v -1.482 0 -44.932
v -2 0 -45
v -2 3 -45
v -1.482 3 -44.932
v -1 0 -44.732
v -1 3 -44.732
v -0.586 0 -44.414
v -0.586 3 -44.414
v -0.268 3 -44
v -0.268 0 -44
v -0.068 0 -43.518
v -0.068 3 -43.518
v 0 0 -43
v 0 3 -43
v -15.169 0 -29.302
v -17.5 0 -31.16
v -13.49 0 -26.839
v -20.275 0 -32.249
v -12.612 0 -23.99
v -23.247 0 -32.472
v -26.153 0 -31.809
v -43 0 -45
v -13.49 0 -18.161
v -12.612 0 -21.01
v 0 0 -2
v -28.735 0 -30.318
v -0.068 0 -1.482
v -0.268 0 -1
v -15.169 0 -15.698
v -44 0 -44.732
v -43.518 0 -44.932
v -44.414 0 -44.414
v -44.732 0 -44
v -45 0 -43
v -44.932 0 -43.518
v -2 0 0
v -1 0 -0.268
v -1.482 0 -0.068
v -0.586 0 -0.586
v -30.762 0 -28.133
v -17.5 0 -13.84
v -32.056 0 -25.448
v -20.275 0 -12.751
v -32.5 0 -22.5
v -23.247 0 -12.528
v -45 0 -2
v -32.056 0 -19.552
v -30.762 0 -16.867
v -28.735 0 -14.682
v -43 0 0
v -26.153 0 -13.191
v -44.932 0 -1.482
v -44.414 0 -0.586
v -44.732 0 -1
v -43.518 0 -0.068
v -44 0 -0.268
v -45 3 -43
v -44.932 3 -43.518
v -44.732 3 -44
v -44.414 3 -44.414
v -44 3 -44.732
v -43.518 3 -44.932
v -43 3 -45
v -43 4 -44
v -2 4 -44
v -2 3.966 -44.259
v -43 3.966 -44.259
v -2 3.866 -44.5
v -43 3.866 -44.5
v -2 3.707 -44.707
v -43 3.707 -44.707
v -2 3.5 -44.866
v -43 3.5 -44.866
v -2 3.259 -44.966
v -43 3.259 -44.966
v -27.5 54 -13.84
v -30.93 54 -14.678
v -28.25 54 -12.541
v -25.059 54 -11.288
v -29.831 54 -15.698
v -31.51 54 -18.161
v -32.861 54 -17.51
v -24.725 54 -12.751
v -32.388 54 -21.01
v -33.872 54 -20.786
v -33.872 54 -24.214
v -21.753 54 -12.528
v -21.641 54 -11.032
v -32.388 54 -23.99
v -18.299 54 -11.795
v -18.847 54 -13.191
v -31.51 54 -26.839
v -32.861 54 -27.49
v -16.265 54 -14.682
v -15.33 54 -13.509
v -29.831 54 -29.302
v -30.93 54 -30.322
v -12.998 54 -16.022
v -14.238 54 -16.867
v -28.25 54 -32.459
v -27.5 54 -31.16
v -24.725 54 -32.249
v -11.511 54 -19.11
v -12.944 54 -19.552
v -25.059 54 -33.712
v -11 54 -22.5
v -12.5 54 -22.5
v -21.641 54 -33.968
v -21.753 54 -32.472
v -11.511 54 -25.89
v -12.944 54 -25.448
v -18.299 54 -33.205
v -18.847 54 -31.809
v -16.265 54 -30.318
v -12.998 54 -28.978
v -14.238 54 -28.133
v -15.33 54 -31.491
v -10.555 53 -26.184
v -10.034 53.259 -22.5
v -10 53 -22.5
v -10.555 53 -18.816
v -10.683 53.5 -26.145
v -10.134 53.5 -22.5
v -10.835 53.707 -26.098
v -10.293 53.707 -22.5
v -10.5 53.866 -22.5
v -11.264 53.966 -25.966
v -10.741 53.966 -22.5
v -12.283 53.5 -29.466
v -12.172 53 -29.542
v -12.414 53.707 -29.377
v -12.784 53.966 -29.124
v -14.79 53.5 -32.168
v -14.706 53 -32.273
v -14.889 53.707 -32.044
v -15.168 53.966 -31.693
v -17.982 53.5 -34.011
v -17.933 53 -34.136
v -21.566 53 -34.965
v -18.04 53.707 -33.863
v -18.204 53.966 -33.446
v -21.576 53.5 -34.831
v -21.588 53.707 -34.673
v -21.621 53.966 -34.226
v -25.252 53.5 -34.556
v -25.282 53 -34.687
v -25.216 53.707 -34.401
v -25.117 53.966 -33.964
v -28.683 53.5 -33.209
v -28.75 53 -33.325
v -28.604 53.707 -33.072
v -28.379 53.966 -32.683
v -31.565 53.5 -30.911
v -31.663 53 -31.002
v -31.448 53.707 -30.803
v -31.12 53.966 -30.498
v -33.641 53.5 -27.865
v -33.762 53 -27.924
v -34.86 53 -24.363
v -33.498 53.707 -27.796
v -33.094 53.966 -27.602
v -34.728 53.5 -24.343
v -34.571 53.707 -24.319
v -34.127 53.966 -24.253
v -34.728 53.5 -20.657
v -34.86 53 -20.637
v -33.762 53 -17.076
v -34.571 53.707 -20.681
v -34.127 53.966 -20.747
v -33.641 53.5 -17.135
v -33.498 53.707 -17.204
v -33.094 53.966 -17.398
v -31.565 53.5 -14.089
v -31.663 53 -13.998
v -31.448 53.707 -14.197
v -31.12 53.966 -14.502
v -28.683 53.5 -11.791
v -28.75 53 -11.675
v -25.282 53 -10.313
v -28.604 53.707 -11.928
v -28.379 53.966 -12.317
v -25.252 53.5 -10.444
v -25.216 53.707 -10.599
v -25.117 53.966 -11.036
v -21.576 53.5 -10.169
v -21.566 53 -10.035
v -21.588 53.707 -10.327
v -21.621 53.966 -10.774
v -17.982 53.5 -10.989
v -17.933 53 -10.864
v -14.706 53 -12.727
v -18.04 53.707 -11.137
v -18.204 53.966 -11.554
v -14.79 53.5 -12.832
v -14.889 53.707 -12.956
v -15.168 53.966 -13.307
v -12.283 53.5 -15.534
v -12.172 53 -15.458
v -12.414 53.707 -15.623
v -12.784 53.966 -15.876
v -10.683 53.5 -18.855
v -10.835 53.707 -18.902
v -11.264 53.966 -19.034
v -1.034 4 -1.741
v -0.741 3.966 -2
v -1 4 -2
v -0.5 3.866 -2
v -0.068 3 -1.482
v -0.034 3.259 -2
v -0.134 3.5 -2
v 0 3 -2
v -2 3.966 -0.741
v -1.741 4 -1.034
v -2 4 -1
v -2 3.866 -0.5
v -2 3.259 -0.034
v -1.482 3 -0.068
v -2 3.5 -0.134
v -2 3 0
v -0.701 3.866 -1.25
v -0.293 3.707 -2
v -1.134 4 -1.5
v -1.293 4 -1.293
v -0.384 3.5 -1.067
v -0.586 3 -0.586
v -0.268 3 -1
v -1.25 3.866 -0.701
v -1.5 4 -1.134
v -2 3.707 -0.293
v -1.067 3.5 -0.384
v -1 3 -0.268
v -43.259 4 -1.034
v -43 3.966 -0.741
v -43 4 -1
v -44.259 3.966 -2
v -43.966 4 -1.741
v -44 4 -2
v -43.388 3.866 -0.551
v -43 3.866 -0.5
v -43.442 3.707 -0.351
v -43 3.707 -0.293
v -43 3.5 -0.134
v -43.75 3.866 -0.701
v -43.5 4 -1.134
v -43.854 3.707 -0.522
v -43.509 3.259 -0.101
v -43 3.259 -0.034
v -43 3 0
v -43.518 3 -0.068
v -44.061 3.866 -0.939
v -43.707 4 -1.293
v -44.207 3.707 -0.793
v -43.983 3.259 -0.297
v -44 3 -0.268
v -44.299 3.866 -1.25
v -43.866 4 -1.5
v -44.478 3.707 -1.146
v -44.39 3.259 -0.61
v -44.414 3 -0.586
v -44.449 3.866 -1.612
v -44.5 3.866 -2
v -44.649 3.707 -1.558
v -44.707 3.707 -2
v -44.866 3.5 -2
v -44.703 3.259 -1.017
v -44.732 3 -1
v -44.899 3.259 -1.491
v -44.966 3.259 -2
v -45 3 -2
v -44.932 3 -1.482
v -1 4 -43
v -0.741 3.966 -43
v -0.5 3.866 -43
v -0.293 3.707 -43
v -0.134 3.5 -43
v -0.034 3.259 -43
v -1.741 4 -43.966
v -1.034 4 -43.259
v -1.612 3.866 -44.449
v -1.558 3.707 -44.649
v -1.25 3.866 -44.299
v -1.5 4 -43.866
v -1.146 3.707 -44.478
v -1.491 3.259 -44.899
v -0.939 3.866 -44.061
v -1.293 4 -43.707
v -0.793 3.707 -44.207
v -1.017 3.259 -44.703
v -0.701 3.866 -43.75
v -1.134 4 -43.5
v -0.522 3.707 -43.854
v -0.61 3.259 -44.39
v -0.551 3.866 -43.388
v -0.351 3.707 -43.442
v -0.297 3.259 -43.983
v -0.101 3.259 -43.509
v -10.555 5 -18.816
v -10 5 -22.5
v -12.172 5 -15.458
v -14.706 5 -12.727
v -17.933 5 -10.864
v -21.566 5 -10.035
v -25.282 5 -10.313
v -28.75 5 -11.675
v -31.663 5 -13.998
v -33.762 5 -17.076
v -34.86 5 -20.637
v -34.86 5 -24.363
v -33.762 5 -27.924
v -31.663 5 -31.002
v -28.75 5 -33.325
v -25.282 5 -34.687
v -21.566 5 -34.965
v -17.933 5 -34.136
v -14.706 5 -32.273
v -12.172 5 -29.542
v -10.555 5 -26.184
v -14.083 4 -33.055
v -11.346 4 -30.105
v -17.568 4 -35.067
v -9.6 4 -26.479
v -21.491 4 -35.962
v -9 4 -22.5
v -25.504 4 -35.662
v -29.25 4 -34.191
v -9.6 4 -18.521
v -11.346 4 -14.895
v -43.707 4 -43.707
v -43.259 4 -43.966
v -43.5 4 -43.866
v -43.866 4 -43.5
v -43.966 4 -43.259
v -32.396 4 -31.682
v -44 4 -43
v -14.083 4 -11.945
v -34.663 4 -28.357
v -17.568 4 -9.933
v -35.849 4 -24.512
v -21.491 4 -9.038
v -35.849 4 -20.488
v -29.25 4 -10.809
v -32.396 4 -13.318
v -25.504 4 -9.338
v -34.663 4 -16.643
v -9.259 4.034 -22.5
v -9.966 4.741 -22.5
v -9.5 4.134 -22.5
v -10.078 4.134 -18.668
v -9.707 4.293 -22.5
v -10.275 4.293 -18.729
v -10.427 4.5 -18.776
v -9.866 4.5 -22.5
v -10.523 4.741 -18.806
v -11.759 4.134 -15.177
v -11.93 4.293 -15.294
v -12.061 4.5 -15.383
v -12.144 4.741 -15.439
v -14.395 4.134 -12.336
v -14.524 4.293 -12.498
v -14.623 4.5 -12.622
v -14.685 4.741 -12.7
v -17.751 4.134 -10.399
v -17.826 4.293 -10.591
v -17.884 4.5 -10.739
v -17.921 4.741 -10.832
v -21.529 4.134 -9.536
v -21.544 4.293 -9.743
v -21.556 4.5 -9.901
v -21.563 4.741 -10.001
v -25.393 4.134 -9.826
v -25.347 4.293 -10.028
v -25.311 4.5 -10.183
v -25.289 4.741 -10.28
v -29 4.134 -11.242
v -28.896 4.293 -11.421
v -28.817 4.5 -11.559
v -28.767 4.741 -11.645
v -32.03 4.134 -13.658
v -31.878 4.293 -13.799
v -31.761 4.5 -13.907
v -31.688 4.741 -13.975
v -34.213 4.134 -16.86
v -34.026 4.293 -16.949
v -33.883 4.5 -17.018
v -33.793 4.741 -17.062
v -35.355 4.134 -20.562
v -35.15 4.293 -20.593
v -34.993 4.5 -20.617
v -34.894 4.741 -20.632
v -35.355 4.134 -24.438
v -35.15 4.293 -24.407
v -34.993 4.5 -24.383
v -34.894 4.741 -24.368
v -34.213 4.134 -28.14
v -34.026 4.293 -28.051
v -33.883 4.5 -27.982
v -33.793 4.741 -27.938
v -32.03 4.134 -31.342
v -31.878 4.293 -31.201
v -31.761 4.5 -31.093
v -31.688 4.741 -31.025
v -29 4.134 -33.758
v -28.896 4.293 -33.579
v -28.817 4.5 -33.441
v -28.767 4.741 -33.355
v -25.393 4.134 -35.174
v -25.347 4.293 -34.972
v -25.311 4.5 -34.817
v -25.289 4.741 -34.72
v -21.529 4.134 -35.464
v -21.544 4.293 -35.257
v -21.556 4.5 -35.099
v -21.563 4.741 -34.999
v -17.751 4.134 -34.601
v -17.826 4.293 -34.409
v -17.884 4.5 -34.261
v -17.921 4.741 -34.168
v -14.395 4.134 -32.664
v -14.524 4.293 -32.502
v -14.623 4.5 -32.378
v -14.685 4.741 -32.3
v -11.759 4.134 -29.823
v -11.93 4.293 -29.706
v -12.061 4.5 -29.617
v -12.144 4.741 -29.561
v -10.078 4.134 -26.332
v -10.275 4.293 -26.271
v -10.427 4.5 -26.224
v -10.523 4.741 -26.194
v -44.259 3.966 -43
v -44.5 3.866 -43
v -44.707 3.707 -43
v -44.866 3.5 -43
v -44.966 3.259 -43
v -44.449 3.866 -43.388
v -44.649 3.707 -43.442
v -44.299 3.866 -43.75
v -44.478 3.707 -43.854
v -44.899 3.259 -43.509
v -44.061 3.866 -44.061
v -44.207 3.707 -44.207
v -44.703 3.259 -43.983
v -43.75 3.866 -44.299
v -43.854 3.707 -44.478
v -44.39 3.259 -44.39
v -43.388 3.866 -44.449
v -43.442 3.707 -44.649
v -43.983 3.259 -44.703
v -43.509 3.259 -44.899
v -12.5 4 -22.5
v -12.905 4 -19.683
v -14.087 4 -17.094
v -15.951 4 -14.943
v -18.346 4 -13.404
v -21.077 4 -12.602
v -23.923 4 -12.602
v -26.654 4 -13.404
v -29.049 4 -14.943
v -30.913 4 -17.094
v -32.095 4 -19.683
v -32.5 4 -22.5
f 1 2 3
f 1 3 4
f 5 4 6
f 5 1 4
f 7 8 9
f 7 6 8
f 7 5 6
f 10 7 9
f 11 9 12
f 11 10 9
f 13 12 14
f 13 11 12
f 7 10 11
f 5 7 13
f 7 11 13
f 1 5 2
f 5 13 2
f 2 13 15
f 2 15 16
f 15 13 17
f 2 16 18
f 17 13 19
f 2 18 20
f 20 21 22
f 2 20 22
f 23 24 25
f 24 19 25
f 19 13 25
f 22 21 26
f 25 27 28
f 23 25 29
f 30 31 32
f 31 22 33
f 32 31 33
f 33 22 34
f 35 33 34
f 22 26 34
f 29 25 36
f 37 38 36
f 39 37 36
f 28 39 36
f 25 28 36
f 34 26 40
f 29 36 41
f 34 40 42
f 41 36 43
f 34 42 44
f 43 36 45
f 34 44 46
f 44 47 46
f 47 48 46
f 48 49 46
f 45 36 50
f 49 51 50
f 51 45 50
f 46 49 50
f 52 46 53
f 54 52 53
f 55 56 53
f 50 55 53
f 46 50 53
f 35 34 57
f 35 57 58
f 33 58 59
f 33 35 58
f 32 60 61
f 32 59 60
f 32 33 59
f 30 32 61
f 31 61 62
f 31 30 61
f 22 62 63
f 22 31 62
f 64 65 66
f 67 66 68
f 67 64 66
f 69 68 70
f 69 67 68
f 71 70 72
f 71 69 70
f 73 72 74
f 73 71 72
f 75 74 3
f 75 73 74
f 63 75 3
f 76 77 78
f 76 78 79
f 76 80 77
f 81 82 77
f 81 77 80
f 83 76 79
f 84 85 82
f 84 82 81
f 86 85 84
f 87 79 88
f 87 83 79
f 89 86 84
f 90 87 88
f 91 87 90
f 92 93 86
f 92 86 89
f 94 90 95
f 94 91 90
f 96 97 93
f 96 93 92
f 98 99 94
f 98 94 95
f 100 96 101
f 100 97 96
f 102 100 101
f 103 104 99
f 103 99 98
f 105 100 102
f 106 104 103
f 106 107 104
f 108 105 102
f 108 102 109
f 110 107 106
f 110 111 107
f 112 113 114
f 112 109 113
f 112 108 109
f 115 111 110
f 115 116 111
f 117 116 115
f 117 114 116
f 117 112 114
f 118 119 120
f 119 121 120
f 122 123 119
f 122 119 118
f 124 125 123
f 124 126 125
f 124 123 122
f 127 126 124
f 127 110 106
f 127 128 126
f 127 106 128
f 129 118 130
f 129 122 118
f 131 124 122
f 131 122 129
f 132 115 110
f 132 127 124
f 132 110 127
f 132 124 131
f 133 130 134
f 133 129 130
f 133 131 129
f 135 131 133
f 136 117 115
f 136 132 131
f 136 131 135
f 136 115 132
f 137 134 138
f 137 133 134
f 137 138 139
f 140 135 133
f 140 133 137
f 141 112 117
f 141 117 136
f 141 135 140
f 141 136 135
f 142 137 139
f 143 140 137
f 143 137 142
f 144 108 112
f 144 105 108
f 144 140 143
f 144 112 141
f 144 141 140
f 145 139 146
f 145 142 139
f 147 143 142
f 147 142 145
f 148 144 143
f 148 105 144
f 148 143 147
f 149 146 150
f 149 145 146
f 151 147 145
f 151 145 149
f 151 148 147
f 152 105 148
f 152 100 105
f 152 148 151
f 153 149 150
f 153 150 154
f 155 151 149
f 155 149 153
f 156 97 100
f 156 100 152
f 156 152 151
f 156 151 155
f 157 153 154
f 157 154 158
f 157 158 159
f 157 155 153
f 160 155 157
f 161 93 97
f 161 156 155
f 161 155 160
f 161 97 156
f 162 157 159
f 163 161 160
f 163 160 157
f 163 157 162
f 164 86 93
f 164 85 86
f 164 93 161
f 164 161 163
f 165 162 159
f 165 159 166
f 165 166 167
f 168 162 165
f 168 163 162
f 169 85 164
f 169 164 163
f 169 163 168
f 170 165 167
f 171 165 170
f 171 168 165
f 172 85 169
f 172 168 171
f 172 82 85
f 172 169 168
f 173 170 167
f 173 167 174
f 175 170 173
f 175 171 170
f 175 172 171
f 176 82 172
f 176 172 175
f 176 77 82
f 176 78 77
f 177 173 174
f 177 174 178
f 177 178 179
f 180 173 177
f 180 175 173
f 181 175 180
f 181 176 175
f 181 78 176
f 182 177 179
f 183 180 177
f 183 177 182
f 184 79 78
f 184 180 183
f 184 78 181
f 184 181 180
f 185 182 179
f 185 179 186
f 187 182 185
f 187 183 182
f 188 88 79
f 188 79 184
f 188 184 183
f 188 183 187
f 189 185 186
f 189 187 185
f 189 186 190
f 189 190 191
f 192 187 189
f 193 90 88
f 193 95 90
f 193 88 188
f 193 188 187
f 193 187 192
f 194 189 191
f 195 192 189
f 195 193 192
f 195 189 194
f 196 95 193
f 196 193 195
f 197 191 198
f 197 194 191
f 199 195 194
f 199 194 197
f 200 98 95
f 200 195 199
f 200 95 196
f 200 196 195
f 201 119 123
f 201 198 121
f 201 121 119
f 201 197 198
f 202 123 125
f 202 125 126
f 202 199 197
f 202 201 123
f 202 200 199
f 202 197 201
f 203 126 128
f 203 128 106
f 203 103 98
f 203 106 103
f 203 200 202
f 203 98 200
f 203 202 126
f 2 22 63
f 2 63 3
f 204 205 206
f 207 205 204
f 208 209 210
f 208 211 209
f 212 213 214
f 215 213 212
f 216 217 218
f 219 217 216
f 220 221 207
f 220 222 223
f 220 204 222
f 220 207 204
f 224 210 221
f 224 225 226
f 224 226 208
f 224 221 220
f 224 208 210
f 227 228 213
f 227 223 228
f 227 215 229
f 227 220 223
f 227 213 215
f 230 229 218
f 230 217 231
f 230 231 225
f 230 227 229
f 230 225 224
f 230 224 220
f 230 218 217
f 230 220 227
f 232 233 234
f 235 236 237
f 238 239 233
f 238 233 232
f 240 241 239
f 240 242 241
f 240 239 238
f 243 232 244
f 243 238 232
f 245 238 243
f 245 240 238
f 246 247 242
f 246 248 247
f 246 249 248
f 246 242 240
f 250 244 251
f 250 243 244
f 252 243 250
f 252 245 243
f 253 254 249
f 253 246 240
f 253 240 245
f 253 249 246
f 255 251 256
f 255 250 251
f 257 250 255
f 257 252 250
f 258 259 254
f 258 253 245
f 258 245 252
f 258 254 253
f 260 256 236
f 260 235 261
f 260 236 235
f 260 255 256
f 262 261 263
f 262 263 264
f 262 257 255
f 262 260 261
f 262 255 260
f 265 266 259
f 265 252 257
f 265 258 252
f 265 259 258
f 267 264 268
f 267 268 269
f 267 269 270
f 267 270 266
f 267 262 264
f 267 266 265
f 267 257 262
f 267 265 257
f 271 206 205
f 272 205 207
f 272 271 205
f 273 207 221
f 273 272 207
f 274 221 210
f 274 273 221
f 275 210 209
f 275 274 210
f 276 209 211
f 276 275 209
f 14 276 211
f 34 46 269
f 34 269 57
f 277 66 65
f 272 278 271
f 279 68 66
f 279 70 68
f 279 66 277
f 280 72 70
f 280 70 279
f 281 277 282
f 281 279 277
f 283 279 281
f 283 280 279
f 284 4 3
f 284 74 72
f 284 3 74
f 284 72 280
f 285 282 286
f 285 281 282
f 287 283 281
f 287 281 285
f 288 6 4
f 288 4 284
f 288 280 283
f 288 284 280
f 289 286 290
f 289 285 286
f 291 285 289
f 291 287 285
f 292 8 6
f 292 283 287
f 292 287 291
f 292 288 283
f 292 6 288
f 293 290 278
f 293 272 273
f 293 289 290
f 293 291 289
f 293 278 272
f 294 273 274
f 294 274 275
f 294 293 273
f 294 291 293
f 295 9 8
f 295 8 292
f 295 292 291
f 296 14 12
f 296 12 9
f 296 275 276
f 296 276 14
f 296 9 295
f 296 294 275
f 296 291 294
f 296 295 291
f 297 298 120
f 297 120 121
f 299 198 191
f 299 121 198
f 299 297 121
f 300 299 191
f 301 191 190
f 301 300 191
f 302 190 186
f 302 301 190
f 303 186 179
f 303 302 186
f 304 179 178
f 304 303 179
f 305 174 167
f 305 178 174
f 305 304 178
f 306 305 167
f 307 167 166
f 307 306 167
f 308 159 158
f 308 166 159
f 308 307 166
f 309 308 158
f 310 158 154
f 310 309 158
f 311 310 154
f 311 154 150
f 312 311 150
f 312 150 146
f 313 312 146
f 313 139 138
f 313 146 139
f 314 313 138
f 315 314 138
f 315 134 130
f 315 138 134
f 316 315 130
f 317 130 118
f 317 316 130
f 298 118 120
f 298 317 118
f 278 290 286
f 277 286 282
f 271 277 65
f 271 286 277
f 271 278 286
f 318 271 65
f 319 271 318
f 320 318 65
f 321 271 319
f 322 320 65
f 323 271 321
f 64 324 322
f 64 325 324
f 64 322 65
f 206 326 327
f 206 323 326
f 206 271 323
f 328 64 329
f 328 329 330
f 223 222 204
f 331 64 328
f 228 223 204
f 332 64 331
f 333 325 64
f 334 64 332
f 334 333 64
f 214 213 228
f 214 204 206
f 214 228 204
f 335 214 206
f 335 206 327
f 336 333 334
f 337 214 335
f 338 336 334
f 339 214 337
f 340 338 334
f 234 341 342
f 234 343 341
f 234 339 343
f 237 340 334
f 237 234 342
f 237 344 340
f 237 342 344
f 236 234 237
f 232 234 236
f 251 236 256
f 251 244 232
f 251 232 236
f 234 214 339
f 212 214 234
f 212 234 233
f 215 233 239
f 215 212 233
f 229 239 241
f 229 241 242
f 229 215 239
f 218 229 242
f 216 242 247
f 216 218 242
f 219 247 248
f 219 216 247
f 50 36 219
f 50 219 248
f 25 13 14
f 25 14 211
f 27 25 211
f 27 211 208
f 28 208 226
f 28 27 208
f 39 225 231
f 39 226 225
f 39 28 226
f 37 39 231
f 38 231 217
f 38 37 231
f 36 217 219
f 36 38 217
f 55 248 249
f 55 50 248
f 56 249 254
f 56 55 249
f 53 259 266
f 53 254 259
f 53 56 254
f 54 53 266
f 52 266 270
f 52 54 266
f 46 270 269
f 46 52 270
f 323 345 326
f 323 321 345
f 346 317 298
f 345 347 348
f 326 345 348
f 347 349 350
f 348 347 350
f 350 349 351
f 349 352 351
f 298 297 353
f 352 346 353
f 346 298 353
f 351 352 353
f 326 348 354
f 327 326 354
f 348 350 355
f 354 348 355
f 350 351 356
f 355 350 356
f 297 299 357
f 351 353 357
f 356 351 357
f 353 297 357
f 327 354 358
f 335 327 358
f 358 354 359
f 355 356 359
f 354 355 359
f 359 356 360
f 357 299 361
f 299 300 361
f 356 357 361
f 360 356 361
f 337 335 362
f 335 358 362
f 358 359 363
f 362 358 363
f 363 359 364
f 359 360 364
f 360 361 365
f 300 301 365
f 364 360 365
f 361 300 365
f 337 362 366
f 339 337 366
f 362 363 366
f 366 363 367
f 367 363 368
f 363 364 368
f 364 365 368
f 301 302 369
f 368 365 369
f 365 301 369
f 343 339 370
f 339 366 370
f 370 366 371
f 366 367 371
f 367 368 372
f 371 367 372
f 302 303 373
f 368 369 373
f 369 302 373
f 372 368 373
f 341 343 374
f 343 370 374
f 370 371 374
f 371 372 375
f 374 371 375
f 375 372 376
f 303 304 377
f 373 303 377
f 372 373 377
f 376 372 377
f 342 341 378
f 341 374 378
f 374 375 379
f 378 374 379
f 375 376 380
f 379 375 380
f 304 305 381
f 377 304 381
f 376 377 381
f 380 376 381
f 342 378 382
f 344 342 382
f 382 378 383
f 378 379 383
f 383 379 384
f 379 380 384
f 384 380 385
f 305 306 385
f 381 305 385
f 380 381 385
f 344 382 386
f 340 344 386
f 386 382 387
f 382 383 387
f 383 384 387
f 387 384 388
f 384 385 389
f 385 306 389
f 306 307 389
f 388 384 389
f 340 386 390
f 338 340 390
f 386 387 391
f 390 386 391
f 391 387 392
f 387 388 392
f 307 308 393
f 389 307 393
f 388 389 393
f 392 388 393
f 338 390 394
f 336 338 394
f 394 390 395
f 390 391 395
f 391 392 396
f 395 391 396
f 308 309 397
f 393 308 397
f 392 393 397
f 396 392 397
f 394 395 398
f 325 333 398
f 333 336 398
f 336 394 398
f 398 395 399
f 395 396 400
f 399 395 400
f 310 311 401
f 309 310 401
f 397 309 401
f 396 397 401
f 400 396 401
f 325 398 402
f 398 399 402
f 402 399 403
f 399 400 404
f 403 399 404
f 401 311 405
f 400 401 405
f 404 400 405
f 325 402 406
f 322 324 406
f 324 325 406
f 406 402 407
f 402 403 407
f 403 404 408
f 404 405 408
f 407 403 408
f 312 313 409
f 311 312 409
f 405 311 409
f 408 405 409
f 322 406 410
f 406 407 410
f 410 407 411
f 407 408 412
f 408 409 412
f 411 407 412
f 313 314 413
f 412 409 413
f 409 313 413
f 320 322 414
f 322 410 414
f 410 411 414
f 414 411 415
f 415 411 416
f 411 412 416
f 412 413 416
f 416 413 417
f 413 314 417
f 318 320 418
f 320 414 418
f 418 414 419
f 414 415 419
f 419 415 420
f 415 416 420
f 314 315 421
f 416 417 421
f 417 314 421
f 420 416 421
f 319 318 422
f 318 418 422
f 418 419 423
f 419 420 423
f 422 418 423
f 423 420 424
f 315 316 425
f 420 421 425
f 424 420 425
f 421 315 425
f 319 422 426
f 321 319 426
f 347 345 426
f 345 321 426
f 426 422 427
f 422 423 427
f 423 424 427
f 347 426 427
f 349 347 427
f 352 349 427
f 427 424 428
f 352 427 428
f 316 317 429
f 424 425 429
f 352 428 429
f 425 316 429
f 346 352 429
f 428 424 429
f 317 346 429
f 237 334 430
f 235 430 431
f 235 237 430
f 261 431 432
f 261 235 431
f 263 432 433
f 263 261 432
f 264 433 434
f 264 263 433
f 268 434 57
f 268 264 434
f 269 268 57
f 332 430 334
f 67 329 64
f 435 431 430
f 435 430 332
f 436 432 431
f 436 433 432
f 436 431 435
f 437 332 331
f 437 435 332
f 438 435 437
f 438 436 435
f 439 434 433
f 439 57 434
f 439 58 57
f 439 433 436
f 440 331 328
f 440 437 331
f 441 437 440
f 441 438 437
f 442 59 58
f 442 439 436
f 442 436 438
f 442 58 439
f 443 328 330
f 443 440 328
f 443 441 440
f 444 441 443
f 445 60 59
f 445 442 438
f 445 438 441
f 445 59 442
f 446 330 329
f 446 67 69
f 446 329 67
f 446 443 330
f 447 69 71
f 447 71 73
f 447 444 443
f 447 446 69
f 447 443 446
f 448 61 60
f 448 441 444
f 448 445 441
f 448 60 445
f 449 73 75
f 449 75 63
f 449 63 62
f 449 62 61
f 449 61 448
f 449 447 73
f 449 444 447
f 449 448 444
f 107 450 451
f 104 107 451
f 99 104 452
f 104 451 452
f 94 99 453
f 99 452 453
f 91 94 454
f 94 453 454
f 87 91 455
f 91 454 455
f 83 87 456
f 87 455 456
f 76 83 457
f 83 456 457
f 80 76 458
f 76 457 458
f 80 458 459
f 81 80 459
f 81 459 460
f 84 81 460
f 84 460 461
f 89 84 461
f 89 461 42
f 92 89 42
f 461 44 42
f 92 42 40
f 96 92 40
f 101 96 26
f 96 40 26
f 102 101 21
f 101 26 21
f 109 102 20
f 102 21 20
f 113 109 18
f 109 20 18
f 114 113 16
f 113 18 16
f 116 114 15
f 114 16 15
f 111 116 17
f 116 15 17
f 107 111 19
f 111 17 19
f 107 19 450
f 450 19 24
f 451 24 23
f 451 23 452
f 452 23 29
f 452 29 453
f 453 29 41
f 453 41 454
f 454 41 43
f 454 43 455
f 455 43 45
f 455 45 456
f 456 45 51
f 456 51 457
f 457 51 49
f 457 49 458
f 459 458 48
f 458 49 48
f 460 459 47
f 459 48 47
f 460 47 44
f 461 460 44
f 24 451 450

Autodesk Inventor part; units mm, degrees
ref_plane "YZ Plane" through (0, 0, 0) normal (1, 0, 0) x (0, 1, 0)
ref_plane "XZ Plane" through (0, 0, 0) normal (0, 1, 0) x (-1, 0, 0)
ref_plane "XY Plane" through (0, 0, 0) normal (0, 0, 1) x (1, 0, 0)
sketch "底面" plane through (0, 0, 0) normal (0, 1, 0) x (-1, 0, 0)
  line L0 (2, 0) -> (43, 0)
  line L1 (45, -2) -> (45, -43)
  line L2 (43, -45) -> (2, -45)
  line L3 (0, -43) -> (0, -2)
  arc A0 (45, -2) -> (43, 0) centre (43, -2) ccw
  arc A1 (43, -45) -> (45, -43) centre (43, -43) ccw
  arc A2 (0, -43) -> (2, -45) centre (2, -43) ccw
  arc A3 (2, 0) -> (0, -2) centre (2, -2) ccw
  circle A4 centre (22.5, -22.5) radius 10
  point P0 (0, 0)
  point P1 (45, -45)
  point P2 (45, 0)
  point P3 (0, -45)
  point P4 (45, -22.5)
  point P5 (22.5, 0)
  dimension "d0" = 45
  dimension "d1" = 45
  dimension "d2" = 2
  dimension "d8" = 20
extrude "底" add sketch "底面" along normal blind 4
sketch "スケッチ2" plane through (0, 4, 0) normal (0, 1, 0) x (1, 0, 0)
  circle A0 centre (-22.5, 22.5) radius 12.5
  line L0 (-43, 0) -> (-2, 0) projected
  line L1 (-45, 43) -> (-45, 2) projected
  circle A1 centre (-22.5, 22.5) radius 10 projected
  point P0 (0, 0)
  point P1 (-22.5, 0)
  point P2 (-45, 22.5)
  dimension "d5" = 25
extrude "棒" add sketch "スケッチ2" along normal blind 50
fillet "フィレット1" radius 1 2 edges at (-35, 4, -22.5) (-35, 54, -22.5)
fillet "フィレット2" radius 1 8 edges at (-0.5858, 4, -0.5858) (0, 4, -22.5) (-0.5858, 4, -44.4142) (-22.5, 4, -45) (-44.4142, 4, -44.4142) (-45, 4, -22.5) (-44.4142, 4, -0.5858) (-22.5, 4, 0)
equation "\"d0\" = d1"
properties part number "pole-2_3D プリント"
